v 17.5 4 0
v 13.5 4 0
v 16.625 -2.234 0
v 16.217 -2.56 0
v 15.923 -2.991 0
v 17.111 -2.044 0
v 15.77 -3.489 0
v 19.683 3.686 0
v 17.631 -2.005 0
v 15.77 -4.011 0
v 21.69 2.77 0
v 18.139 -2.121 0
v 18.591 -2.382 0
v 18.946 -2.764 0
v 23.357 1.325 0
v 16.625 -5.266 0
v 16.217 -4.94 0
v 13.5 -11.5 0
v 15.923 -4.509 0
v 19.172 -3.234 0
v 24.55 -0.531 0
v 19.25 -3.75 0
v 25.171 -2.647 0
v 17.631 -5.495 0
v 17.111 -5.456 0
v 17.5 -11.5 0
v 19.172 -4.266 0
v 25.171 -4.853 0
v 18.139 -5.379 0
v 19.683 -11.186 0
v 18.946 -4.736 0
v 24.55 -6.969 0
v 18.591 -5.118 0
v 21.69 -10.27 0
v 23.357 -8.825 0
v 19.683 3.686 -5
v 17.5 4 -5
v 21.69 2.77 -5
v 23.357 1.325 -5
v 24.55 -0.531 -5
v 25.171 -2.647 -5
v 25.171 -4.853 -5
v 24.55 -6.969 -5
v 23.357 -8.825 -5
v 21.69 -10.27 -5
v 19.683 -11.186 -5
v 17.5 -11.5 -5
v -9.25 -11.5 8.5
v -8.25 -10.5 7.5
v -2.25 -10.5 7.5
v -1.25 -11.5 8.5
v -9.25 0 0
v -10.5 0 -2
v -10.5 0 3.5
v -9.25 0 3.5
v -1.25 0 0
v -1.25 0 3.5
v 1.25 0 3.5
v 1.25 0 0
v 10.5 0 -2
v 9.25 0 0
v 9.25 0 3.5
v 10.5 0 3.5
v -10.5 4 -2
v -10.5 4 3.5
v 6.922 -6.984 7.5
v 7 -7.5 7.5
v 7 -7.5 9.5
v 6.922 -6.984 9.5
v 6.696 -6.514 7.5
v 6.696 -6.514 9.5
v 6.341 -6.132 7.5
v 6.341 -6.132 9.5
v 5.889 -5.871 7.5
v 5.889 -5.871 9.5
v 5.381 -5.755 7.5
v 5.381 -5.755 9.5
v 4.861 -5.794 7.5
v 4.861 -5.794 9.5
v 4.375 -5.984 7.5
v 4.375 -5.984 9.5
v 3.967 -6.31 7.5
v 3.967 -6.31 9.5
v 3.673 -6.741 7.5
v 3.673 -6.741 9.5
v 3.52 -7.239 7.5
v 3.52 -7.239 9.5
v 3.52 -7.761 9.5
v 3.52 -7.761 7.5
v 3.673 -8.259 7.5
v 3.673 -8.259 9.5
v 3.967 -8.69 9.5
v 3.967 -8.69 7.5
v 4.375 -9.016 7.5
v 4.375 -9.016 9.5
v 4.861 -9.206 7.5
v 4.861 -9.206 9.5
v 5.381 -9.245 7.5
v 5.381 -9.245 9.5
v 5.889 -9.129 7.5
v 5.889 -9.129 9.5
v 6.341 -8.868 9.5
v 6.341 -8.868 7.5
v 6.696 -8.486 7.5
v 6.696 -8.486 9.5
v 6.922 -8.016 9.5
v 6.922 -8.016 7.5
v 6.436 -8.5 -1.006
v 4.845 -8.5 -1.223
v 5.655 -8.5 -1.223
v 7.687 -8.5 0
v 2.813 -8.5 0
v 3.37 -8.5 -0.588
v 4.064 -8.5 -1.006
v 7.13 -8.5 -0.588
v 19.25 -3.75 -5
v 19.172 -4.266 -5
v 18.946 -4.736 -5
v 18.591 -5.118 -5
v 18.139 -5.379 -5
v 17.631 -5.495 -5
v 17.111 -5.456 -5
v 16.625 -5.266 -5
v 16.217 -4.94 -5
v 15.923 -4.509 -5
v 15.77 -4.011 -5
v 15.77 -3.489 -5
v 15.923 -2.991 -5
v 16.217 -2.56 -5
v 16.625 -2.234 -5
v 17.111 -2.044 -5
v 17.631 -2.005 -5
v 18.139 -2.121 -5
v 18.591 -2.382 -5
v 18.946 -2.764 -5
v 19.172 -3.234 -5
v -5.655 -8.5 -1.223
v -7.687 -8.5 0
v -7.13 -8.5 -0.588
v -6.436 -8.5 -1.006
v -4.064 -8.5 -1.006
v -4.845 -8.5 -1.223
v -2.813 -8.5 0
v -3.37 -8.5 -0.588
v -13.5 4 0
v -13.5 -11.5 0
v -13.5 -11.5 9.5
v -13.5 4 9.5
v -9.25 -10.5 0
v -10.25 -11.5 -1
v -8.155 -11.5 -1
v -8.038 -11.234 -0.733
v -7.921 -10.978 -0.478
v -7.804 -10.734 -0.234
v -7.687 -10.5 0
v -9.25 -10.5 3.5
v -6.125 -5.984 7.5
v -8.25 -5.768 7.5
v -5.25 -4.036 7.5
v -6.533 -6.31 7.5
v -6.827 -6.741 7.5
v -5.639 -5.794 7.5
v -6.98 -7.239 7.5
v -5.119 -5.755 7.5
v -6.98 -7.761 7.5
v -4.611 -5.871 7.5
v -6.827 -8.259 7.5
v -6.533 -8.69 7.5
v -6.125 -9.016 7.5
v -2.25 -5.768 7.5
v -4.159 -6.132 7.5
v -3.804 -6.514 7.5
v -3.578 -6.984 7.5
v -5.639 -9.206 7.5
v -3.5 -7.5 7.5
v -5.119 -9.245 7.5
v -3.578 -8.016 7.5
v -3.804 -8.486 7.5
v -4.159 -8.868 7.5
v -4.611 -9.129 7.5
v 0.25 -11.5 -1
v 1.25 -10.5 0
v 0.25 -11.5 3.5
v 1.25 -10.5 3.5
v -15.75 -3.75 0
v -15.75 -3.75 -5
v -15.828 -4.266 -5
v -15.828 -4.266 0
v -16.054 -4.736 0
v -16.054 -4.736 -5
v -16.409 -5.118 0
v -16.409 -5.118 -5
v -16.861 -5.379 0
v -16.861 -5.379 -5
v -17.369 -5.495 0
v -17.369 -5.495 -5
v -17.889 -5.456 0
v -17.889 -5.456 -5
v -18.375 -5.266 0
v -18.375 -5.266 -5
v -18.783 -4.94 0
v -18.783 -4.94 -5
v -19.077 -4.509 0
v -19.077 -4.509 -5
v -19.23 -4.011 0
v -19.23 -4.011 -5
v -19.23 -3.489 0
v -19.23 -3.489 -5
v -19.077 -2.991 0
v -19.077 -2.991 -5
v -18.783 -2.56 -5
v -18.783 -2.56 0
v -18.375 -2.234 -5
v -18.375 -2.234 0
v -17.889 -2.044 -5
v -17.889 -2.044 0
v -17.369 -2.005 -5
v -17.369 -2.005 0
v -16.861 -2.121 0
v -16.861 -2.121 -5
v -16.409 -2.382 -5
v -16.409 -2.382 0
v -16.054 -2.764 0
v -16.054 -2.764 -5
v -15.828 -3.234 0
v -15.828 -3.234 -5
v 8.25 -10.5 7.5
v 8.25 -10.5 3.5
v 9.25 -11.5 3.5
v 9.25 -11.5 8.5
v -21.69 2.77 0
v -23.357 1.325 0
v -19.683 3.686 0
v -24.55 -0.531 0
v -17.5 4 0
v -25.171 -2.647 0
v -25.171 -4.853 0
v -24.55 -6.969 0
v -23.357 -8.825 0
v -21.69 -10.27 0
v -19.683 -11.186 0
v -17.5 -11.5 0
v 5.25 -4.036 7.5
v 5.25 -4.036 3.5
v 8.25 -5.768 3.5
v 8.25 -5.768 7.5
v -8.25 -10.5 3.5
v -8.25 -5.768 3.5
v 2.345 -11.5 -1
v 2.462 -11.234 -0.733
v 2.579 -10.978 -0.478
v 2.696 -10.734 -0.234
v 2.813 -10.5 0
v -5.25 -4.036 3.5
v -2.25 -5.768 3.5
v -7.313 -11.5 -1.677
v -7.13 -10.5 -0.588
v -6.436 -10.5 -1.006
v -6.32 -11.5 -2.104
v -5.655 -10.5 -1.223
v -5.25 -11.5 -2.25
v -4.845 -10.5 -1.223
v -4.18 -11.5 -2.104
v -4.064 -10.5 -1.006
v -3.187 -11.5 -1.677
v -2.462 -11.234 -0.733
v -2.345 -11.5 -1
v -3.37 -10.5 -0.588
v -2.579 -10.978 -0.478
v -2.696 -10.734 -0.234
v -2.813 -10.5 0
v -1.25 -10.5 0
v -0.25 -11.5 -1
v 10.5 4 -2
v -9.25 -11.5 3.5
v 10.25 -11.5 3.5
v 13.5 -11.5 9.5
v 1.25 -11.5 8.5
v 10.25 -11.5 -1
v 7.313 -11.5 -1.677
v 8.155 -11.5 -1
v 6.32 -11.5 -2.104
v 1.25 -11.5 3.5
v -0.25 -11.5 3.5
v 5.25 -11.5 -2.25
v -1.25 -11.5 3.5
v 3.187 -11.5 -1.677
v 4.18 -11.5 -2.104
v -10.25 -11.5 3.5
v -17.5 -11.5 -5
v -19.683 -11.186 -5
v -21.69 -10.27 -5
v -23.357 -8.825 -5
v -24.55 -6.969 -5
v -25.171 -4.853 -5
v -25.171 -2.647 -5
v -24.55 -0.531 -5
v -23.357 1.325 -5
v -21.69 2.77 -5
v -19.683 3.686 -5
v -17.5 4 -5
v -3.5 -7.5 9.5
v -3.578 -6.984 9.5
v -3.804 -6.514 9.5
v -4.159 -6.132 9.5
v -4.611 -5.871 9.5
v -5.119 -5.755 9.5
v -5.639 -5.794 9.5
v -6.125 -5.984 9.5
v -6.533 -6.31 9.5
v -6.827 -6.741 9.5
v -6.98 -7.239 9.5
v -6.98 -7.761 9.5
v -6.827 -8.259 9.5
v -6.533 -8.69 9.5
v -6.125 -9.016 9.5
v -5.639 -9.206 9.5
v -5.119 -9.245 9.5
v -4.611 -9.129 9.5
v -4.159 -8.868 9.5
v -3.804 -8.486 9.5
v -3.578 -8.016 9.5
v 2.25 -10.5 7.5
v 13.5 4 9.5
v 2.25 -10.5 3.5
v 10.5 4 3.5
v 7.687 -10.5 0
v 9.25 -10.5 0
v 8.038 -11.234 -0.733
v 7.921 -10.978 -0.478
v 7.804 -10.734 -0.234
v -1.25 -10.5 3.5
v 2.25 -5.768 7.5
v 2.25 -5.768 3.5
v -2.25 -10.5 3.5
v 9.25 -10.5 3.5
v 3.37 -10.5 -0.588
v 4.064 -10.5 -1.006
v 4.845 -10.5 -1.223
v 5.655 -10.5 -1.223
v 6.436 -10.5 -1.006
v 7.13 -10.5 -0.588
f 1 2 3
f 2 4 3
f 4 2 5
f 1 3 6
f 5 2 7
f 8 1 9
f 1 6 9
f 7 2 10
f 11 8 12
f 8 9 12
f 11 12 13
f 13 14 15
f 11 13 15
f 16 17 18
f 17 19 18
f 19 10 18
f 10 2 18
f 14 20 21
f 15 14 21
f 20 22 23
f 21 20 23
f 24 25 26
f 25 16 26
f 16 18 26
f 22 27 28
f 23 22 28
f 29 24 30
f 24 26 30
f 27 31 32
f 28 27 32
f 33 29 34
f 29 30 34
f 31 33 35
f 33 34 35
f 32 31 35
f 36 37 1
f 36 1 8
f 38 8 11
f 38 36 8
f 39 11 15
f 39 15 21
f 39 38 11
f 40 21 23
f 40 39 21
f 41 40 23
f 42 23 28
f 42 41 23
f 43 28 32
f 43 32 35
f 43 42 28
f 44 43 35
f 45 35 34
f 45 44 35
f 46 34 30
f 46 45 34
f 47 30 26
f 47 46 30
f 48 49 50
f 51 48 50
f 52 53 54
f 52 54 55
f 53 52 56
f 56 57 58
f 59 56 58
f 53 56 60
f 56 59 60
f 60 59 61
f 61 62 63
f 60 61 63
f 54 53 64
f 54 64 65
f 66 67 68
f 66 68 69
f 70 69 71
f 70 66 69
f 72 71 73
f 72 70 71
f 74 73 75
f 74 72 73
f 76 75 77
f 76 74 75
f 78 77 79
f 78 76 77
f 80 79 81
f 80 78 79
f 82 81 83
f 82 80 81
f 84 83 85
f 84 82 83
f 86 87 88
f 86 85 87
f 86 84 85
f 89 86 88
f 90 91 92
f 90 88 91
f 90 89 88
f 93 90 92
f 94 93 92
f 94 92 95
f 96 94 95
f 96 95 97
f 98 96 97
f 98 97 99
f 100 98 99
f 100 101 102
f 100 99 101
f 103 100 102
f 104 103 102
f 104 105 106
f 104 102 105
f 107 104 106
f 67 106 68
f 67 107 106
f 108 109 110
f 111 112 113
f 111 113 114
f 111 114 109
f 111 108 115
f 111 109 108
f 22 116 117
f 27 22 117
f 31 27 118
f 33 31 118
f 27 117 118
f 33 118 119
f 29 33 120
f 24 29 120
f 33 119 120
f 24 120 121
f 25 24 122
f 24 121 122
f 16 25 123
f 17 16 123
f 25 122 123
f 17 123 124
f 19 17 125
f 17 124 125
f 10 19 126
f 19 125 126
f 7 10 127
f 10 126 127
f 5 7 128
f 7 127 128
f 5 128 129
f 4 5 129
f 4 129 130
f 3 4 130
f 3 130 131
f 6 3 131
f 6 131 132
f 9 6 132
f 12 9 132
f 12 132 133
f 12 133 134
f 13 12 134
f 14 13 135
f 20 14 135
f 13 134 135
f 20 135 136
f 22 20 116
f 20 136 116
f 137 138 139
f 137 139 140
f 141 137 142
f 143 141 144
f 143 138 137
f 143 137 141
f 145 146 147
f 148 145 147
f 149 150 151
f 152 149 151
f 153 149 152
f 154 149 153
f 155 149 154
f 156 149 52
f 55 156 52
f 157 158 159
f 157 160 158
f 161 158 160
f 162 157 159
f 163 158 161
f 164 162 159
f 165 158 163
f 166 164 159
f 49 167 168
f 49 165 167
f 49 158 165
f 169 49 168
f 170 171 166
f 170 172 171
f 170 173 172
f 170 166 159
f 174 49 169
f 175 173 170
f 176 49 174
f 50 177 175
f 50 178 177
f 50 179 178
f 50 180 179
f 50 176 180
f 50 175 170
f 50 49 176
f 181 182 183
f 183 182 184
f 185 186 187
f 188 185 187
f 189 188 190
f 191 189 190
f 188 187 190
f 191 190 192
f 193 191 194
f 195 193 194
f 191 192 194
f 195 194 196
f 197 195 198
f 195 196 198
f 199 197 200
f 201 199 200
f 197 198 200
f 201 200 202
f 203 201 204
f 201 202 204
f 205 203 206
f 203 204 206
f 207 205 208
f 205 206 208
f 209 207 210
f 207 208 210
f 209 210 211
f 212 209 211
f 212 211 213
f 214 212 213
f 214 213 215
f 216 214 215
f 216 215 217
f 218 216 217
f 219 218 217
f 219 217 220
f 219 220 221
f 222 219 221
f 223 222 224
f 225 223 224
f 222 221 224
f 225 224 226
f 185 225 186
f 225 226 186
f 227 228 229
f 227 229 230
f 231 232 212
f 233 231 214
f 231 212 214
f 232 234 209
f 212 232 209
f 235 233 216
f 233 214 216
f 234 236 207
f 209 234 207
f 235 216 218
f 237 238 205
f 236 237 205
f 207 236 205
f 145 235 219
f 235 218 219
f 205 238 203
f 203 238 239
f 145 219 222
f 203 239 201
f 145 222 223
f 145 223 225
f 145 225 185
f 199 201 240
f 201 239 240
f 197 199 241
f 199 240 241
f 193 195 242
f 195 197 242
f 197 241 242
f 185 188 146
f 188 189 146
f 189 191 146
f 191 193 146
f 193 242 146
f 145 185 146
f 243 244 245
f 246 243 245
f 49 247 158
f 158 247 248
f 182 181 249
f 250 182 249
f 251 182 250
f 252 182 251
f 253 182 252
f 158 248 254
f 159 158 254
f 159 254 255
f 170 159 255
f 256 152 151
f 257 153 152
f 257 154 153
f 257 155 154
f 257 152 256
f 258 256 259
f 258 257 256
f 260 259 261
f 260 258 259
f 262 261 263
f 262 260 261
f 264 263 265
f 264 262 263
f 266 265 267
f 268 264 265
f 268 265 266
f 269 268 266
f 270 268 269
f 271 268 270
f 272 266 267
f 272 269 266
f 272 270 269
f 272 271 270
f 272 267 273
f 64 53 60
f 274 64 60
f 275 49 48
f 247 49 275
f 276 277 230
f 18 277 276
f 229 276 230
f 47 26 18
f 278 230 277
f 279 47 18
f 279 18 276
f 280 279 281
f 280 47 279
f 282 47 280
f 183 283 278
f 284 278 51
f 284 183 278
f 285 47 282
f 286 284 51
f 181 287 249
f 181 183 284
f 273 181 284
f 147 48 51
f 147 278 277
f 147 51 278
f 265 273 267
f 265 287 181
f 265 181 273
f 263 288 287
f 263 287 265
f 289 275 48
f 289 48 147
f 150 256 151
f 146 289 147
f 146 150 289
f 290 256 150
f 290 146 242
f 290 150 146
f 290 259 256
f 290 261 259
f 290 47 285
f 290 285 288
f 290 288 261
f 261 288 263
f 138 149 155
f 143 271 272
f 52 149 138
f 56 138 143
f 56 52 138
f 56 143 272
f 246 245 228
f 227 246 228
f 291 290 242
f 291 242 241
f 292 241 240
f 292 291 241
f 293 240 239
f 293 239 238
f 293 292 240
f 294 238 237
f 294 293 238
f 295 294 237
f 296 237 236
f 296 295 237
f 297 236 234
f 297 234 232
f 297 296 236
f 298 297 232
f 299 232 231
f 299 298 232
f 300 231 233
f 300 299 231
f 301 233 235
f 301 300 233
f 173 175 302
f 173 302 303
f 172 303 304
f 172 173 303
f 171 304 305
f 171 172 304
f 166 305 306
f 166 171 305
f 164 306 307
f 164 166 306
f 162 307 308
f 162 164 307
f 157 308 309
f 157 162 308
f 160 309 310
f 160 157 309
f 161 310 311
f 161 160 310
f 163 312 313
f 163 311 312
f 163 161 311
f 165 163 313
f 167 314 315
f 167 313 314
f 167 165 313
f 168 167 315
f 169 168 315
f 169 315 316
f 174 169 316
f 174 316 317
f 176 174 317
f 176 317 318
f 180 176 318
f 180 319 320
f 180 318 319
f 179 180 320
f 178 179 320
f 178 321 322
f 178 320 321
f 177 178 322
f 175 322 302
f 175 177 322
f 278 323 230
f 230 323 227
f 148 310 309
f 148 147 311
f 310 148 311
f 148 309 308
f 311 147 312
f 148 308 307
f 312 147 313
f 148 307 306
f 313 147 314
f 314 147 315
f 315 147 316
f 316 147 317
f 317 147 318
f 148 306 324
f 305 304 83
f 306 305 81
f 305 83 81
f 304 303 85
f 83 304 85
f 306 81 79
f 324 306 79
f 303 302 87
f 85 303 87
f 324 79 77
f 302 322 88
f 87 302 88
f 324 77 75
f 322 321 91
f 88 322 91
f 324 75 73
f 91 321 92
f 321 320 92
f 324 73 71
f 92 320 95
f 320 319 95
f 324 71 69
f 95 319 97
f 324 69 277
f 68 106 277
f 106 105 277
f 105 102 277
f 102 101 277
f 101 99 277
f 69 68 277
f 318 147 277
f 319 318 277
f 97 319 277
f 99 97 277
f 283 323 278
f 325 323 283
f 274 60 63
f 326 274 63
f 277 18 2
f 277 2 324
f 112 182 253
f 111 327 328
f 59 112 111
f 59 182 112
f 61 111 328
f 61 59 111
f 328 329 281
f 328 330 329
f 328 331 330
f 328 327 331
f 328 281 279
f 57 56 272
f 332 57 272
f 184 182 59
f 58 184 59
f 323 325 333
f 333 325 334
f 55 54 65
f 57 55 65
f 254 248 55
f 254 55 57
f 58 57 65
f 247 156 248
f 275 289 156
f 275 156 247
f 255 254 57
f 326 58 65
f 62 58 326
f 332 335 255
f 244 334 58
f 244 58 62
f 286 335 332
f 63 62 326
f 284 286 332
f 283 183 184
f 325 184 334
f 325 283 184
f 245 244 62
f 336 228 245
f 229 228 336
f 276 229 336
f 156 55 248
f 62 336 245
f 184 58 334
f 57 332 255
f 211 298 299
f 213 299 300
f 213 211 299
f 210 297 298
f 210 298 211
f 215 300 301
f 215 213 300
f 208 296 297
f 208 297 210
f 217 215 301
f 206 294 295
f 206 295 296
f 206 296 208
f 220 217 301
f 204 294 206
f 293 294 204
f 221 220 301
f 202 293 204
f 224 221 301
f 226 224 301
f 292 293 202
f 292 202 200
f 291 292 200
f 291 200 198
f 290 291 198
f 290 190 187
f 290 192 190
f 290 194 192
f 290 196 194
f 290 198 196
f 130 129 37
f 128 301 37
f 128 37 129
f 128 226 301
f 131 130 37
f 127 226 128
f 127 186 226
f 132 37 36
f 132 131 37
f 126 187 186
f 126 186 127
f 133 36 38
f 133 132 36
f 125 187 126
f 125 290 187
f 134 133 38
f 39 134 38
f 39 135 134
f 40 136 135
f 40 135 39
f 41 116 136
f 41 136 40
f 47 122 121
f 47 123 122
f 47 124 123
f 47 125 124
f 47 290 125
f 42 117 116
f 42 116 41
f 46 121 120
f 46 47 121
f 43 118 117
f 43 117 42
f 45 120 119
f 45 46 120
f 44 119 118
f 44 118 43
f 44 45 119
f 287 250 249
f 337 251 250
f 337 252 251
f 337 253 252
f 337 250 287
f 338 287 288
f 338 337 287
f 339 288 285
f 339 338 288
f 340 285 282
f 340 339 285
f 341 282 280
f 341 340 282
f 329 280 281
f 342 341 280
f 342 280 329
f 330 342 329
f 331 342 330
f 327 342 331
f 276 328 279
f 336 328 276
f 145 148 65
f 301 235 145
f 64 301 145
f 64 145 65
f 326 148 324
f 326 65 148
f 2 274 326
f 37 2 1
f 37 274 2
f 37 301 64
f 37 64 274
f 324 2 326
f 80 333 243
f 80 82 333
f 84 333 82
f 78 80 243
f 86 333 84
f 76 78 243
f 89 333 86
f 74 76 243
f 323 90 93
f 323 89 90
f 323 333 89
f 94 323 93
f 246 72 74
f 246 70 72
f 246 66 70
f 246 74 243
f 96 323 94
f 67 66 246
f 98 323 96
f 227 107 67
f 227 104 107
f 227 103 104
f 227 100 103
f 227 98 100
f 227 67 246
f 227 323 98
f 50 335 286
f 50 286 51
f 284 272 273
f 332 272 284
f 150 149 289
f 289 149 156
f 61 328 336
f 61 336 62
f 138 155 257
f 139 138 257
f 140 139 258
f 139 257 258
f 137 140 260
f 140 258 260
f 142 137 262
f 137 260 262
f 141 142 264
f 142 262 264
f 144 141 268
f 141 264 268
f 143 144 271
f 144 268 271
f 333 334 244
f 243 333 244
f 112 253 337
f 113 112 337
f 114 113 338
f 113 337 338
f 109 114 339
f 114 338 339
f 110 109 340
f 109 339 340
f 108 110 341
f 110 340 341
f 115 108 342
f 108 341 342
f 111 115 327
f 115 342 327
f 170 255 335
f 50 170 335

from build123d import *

# Parameters (mm, degrees)
F1_DEPTH      = 3.5
F0_W          = 1.25
F0_H          = 11.5
F2_W          = 21
F2_H          = 11.5
F3_DEPTH      = 2
F4_W          = 27
F4_H          = 14.5
F4_W_2        = 21
F4_H_2        = 5.5
F5_DEPTH      = 11.5
F5_DEPTH_BACK = 4
F6_R          = 1.75
F7_DEPTH      = 25
F9_DEPTH      = 4
F10_R         = 3
F11_DEPTH     = 3
F12_SIZE      = 0.9999
F13_R         = 1.75
F14_DEPTH     = 5


# Not quite as in the source:
# - a fillet or chamfer is up to 0.001 mm smaller than in the source, because OpenCascade refuses the exact size


with BuildPart() as f1:
    # F0 (on Top) → F1 (new body)
    with BuildSketch(Plane.XY):
        Polygon((1.25, 0), (0, 0), (-1.25, 0), (-1.25, -11.5), (0, -11.5), (1.25, -11.5), align=None)
    extrude(amount=F1_DEPTH)



with BuildPart() as f1b:
    # F0 (on Top) → F1, piece 2 (new body)
    with BuildSketch(Plane.XY):
        with Locations((-9.875, -5.75)):
            Rectangle(F0_W, F0_H)
    extrude(amount=F1_DEPTH)


with BuildPart() as f1c:
    # F0 (on Top) → F1, piece 3 (new body)
    with BuildSketch(Plane.XY):
        with Locations((9.875, -5.75)):
            Rectangle(F0_W, F0_H)
    extrude(amount=F1_DEPTH)


with BuildPart() as f1_1:
    add(f1.part)

    add(f1b.part)  # F3 merges F1b

    add(f1c.part)  # F3 merges F1c
    # F2 (on Top) → F3 (join)
    with BuildSketch(Plane.XY):
        with Locations((0, -5.75)):
            Rectangle(F2_W, F2_H)
    extrude(amount=-F3_DEPTH)

    # F4 (on Front) → F5 (join, two sides)
    with BuildSketch(Plane.XZ) as f5_sk:
        with Locations((0, 2.25)):
            Rectangle(F4_W, F4_H)
        with Locations((0, 0.75)):
            Rectangle(F4_W_2, F4_H_2, mode=Mode.SUBTRACT)
    extrude(amount=F5_DEPTH)
    extrude(f5_sk.sketch, amount=-F5_DEPTH_BACK)

    # F6 (on face) → F7 (cut)
    with BuildSketch(Plane.XY):
        with Locations((5.25, -7.5)):
            Circle(F6_R)
        with Locations((-5.25, -7.5)):
            Circle(F6_R)
    extrude(amount=F7_DEPTH, mode=Mode.SUBTRACT)

    # F8 (on face) → F9 (cut)
    with BuildSketch(Plane(origin=(0, 0, 3.5), x_dir=(1, 0, 0), z_dir=(0, 0, -1))):
        Polygon((2.25, 5.7679491924), (5.25, 4.0358983849), (8.25, 5.7679491924), (8.25, 9.2320508076), (5.25, 10.9641016151), (2.25, 9.2320508076), align=None)
        Polygon((2.25, 21.0246167397), (2.25, 9.2320508076), (5.25, 10.9641016151), (8.25, 9.2320508076), (8.25, 21.0246167397), align=None)
        Polygon((-2.25, 21.0246167397), (-8.25, 21.0246167397), (-8.25, 9.2320508076), (-8.25, 5.7679491924), (-5.25, 4.0358983849), (-2.25, 5.7679491924), (-2.25, 9.2320508076), align=None)
    extrude(amount=-F9_DEPTH, mode=Mode.SUBTRACT)

    # F10 (on face) → F11 (cut)
    with BuildSketch(Plane.XZ.offset(11.5)):
        with Locations((5.25, 1.75)):
            Circle(F10_R)
        with Locations((-5.25, 1.75)):
            Circle(F10_R)
    extrude(amount=-F11_DEPTH, mode=Mode.SUBTRACT)

    # F12 (size 1 in the source; OpenCascade refuses exactly that, so slightly less here)
    f12_edges = [f1_1.edges().sort_by_distance(p)[0] for p in [
        (-1.25, -11.5, 1.75),
        (-9.25, -11.5, 1.75),
        (-2.031651, -11.5, 0),
        (-8.468349, -11.5, 0),
        (2.031651, -11.5, 0),
        (1.25, -11.5, 1.75),
        (5.25, -11.5, -1.25),
        (8.468349, -11.5, 0),
        (9.25, -11.5, 1.75),
        (-5.25, -11.5, -1.25),
        (-8.25, -11.5, 5.5),
        (-5.25, -11.5, 7.5),
        (-2.25, -11.5, 5.5),
        (2.25, -11.5, 5.5),
        (5.25, -11.5, 7.5),
        (8.25, -11.5, 5.5),
    ]]
    chamfer(f12_edges, length=F12_SIZE)

    # F13 (on face) → F14 (join)
    with BuildSketch(Plane(origin=(0, 0, -5), x_dir=(1, 0, 0), z_dir=(0, 0, -1))):
        with BuildLine():
            Line((13.5, -4), (17.5, -4))
            ThreePointArc((17.5, -4), (25.25, 3.75), (17.5, 11.5))
            Line((17.5, 11.5), (13.5, 11.5))
            Line((13.5, 11.5000000001), (13.5, -4))
        make_face()
        with Locations((17.5, 3.75)):
            Circle(F13_R, mode=Mode.SUBTRACT)
        with BuildLine():
            ThreePointArc((-17.5, 11.5), (-25.25, 3.75), (-17.5, -4))
            Line((-17.5, -4), (-13.5, -4))
            Line((-13.5, -4), (-13.5, 11.5000000001))
            Line((-13.5, 11.5), (-17.5, 11.5))
        make_face()
        with Locations((-17.5, 3.75)):
            Circle(F13_R, mode=Mode.SUBTRACT)
    extrude(amount=-F14_DEPTH)


solid = f1_1.part
